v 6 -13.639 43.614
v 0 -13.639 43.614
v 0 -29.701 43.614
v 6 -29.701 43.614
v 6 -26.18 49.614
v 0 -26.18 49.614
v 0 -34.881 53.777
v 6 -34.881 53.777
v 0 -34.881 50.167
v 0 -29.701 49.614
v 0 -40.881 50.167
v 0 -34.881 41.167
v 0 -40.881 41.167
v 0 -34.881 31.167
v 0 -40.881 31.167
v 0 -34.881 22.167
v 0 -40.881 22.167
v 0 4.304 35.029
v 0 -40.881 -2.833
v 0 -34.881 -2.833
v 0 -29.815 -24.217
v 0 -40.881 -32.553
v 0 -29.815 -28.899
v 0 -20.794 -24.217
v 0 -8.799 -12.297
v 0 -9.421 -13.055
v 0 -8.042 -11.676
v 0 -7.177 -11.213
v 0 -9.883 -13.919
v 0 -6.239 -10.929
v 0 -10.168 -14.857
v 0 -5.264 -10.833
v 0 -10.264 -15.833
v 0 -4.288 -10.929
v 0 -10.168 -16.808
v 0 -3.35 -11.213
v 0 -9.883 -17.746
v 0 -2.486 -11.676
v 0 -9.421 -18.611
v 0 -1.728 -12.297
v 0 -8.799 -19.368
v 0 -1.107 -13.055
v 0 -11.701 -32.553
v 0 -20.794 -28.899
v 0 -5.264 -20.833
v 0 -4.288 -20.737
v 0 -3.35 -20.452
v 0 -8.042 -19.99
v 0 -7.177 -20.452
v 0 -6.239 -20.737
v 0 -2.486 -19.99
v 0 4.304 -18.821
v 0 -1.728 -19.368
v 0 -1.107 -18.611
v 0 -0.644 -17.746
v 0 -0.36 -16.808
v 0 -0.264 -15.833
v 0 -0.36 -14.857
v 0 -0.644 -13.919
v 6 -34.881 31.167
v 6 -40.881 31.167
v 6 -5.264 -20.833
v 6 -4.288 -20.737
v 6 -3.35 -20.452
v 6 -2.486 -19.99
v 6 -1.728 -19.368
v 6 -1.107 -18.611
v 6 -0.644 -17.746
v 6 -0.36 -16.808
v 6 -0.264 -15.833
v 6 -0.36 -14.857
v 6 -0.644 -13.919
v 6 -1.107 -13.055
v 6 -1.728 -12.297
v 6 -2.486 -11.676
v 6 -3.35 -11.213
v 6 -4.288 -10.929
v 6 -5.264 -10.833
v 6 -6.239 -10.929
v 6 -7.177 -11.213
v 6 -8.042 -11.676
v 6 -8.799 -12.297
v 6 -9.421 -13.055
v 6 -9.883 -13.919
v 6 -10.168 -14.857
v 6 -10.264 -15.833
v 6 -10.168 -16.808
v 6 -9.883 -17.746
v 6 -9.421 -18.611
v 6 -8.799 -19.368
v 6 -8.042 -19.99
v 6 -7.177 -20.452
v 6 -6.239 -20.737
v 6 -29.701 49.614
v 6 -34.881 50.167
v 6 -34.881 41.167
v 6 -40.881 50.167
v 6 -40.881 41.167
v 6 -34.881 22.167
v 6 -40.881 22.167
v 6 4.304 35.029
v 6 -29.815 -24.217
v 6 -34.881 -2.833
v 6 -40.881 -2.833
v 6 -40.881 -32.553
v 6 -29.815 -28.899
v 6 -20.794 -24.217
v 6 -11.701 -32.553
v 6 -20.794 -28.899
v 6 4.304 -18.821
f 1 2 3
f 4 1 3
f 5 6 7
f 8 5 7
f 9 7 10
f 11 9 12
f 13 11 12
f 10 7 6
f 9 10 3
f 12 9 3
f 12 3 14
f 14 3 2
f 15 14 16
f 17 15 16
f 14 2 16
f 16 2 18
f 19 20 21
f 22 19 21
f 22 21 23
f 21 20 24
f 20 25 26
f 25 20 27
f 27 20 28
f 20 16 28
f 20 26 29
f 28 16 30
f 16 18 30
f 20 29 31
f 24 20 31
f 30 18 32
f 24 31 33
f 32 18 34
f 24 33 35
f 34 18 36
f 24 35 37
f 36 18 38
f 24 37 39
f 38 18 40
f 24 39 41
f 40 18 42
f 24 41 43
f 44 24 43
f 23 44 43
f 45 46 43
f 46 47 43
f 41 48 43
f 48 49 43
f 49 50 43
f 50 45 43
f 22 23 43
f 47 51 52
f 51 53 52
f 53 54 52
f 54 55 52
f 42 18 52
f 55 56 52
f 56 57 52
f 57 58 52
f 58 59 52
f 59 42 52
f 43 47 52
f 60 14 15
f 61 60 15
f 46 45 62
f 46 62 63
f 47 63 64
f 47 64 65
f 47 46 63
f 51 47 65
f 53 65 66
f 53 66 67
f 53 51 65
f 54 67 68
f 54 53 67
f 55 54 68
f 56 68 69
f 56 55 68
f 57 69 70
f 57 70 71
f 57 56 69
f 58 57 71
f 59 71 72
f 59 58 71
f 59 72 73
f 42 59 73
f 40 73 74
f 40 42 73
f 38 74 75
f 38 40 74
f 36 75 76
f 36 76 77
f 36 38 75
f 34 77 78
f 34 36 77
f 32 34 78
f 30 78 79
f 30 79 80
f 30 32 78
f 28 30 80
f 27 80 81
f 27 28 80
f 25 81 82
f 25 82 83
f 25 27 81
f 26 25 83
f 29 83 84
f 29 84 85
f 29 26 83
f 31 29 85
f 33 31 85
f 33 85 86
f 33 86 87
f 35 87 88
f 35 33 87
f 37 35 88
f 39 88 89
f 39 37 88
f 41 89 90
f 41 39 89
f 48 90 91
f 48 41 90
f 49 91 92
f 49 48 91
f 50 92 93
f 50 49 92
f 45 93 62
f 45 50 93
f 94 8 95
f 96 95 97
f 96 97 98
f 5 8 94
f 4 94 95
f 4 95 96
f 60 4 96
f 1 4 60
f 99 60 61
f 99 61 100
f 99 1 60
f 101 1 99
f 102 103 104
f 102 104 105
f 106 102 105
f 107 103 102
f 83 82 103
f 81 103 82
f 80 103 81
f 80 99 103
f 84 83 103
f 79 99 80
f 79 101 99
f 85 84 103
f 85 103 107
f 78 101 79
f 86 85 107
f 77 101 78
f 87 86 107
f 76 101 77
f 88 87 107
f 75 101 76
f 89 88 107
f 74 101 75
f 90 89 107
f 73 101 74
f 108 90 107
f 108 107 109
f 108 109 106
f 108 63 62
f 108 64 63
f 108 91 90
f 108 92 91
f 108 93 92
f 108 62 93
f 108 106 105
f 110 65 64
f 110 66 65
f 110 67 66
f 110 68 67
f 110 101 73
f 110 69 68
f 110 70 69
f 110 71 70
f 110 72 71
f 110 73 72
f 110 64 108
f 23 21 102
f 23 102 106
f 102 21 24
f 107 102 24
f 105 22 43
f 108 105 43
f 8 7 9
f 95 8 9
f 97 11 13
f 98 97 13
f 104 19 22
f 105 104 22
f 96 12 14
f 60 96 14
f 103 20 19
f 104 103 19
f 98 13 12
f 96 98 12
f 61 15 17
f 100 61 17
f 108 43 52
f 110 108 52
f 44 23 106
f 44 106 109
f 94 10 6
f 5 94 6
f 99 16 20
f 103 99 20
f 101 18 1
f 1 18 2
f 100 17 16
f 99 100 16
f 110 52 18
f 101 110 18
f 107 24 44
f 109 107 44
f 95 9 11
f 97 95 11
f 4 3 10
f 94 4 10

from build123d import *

# Parameters (mm, degrees)
SKETCH1_W           = 4.681910348
SKETCH1_H           = 9.021241889
SKETCH1_R           = 5
BOSS_EXTRUDE1_DEPTH = 6


with BuildPart() as part:
    # Sketch1 → Boss-Extrude1 (new body)
    with BuildSketch(Plane(origin=(0, 0, 0), x_dir=(0, 0, -1), z_dir=(1, 0, 0))):
        Polygon((-49.613790305, -26.17980707), (-53.776961548, -34.881370998), (-50.167110133, -34.881370998), (-50.167110133, -40.881370998), (-41.167110133, -40.881370998), (-41.167110133, -34.881370998), (-31.167110133, -34.881370998), (-31.167110133, -40.881370998), (-22.167110133, -40.881370998), (-22.167110133, -34.881370998), (2.832889867, -34.881370998), (2.832889867, -40.881370998), (32.552897546, -40.881370998), (32.552897546, -11.700957806), (18.820856333, 4.303972987), (-35.029148102, 4.303972987), (-43.613790305, -13.639034538), (-43.613790305, -29.701183485), (-49.613790305, -29.701183485), align=None)
        with Locations((26.557768442, -25.304755476)):
            Rectangle(SKETCH1_W, SKETCH1_H, mode=Mode.SUBTRACT)
        with Locations((15.832889867, -5.263895329)):
            Circle(SKETCH1_R, mode=Mode.SUBTRACT)
    extrude(amount=BOSS_EXTRUDE1_DEPTH)


solid = part.part
